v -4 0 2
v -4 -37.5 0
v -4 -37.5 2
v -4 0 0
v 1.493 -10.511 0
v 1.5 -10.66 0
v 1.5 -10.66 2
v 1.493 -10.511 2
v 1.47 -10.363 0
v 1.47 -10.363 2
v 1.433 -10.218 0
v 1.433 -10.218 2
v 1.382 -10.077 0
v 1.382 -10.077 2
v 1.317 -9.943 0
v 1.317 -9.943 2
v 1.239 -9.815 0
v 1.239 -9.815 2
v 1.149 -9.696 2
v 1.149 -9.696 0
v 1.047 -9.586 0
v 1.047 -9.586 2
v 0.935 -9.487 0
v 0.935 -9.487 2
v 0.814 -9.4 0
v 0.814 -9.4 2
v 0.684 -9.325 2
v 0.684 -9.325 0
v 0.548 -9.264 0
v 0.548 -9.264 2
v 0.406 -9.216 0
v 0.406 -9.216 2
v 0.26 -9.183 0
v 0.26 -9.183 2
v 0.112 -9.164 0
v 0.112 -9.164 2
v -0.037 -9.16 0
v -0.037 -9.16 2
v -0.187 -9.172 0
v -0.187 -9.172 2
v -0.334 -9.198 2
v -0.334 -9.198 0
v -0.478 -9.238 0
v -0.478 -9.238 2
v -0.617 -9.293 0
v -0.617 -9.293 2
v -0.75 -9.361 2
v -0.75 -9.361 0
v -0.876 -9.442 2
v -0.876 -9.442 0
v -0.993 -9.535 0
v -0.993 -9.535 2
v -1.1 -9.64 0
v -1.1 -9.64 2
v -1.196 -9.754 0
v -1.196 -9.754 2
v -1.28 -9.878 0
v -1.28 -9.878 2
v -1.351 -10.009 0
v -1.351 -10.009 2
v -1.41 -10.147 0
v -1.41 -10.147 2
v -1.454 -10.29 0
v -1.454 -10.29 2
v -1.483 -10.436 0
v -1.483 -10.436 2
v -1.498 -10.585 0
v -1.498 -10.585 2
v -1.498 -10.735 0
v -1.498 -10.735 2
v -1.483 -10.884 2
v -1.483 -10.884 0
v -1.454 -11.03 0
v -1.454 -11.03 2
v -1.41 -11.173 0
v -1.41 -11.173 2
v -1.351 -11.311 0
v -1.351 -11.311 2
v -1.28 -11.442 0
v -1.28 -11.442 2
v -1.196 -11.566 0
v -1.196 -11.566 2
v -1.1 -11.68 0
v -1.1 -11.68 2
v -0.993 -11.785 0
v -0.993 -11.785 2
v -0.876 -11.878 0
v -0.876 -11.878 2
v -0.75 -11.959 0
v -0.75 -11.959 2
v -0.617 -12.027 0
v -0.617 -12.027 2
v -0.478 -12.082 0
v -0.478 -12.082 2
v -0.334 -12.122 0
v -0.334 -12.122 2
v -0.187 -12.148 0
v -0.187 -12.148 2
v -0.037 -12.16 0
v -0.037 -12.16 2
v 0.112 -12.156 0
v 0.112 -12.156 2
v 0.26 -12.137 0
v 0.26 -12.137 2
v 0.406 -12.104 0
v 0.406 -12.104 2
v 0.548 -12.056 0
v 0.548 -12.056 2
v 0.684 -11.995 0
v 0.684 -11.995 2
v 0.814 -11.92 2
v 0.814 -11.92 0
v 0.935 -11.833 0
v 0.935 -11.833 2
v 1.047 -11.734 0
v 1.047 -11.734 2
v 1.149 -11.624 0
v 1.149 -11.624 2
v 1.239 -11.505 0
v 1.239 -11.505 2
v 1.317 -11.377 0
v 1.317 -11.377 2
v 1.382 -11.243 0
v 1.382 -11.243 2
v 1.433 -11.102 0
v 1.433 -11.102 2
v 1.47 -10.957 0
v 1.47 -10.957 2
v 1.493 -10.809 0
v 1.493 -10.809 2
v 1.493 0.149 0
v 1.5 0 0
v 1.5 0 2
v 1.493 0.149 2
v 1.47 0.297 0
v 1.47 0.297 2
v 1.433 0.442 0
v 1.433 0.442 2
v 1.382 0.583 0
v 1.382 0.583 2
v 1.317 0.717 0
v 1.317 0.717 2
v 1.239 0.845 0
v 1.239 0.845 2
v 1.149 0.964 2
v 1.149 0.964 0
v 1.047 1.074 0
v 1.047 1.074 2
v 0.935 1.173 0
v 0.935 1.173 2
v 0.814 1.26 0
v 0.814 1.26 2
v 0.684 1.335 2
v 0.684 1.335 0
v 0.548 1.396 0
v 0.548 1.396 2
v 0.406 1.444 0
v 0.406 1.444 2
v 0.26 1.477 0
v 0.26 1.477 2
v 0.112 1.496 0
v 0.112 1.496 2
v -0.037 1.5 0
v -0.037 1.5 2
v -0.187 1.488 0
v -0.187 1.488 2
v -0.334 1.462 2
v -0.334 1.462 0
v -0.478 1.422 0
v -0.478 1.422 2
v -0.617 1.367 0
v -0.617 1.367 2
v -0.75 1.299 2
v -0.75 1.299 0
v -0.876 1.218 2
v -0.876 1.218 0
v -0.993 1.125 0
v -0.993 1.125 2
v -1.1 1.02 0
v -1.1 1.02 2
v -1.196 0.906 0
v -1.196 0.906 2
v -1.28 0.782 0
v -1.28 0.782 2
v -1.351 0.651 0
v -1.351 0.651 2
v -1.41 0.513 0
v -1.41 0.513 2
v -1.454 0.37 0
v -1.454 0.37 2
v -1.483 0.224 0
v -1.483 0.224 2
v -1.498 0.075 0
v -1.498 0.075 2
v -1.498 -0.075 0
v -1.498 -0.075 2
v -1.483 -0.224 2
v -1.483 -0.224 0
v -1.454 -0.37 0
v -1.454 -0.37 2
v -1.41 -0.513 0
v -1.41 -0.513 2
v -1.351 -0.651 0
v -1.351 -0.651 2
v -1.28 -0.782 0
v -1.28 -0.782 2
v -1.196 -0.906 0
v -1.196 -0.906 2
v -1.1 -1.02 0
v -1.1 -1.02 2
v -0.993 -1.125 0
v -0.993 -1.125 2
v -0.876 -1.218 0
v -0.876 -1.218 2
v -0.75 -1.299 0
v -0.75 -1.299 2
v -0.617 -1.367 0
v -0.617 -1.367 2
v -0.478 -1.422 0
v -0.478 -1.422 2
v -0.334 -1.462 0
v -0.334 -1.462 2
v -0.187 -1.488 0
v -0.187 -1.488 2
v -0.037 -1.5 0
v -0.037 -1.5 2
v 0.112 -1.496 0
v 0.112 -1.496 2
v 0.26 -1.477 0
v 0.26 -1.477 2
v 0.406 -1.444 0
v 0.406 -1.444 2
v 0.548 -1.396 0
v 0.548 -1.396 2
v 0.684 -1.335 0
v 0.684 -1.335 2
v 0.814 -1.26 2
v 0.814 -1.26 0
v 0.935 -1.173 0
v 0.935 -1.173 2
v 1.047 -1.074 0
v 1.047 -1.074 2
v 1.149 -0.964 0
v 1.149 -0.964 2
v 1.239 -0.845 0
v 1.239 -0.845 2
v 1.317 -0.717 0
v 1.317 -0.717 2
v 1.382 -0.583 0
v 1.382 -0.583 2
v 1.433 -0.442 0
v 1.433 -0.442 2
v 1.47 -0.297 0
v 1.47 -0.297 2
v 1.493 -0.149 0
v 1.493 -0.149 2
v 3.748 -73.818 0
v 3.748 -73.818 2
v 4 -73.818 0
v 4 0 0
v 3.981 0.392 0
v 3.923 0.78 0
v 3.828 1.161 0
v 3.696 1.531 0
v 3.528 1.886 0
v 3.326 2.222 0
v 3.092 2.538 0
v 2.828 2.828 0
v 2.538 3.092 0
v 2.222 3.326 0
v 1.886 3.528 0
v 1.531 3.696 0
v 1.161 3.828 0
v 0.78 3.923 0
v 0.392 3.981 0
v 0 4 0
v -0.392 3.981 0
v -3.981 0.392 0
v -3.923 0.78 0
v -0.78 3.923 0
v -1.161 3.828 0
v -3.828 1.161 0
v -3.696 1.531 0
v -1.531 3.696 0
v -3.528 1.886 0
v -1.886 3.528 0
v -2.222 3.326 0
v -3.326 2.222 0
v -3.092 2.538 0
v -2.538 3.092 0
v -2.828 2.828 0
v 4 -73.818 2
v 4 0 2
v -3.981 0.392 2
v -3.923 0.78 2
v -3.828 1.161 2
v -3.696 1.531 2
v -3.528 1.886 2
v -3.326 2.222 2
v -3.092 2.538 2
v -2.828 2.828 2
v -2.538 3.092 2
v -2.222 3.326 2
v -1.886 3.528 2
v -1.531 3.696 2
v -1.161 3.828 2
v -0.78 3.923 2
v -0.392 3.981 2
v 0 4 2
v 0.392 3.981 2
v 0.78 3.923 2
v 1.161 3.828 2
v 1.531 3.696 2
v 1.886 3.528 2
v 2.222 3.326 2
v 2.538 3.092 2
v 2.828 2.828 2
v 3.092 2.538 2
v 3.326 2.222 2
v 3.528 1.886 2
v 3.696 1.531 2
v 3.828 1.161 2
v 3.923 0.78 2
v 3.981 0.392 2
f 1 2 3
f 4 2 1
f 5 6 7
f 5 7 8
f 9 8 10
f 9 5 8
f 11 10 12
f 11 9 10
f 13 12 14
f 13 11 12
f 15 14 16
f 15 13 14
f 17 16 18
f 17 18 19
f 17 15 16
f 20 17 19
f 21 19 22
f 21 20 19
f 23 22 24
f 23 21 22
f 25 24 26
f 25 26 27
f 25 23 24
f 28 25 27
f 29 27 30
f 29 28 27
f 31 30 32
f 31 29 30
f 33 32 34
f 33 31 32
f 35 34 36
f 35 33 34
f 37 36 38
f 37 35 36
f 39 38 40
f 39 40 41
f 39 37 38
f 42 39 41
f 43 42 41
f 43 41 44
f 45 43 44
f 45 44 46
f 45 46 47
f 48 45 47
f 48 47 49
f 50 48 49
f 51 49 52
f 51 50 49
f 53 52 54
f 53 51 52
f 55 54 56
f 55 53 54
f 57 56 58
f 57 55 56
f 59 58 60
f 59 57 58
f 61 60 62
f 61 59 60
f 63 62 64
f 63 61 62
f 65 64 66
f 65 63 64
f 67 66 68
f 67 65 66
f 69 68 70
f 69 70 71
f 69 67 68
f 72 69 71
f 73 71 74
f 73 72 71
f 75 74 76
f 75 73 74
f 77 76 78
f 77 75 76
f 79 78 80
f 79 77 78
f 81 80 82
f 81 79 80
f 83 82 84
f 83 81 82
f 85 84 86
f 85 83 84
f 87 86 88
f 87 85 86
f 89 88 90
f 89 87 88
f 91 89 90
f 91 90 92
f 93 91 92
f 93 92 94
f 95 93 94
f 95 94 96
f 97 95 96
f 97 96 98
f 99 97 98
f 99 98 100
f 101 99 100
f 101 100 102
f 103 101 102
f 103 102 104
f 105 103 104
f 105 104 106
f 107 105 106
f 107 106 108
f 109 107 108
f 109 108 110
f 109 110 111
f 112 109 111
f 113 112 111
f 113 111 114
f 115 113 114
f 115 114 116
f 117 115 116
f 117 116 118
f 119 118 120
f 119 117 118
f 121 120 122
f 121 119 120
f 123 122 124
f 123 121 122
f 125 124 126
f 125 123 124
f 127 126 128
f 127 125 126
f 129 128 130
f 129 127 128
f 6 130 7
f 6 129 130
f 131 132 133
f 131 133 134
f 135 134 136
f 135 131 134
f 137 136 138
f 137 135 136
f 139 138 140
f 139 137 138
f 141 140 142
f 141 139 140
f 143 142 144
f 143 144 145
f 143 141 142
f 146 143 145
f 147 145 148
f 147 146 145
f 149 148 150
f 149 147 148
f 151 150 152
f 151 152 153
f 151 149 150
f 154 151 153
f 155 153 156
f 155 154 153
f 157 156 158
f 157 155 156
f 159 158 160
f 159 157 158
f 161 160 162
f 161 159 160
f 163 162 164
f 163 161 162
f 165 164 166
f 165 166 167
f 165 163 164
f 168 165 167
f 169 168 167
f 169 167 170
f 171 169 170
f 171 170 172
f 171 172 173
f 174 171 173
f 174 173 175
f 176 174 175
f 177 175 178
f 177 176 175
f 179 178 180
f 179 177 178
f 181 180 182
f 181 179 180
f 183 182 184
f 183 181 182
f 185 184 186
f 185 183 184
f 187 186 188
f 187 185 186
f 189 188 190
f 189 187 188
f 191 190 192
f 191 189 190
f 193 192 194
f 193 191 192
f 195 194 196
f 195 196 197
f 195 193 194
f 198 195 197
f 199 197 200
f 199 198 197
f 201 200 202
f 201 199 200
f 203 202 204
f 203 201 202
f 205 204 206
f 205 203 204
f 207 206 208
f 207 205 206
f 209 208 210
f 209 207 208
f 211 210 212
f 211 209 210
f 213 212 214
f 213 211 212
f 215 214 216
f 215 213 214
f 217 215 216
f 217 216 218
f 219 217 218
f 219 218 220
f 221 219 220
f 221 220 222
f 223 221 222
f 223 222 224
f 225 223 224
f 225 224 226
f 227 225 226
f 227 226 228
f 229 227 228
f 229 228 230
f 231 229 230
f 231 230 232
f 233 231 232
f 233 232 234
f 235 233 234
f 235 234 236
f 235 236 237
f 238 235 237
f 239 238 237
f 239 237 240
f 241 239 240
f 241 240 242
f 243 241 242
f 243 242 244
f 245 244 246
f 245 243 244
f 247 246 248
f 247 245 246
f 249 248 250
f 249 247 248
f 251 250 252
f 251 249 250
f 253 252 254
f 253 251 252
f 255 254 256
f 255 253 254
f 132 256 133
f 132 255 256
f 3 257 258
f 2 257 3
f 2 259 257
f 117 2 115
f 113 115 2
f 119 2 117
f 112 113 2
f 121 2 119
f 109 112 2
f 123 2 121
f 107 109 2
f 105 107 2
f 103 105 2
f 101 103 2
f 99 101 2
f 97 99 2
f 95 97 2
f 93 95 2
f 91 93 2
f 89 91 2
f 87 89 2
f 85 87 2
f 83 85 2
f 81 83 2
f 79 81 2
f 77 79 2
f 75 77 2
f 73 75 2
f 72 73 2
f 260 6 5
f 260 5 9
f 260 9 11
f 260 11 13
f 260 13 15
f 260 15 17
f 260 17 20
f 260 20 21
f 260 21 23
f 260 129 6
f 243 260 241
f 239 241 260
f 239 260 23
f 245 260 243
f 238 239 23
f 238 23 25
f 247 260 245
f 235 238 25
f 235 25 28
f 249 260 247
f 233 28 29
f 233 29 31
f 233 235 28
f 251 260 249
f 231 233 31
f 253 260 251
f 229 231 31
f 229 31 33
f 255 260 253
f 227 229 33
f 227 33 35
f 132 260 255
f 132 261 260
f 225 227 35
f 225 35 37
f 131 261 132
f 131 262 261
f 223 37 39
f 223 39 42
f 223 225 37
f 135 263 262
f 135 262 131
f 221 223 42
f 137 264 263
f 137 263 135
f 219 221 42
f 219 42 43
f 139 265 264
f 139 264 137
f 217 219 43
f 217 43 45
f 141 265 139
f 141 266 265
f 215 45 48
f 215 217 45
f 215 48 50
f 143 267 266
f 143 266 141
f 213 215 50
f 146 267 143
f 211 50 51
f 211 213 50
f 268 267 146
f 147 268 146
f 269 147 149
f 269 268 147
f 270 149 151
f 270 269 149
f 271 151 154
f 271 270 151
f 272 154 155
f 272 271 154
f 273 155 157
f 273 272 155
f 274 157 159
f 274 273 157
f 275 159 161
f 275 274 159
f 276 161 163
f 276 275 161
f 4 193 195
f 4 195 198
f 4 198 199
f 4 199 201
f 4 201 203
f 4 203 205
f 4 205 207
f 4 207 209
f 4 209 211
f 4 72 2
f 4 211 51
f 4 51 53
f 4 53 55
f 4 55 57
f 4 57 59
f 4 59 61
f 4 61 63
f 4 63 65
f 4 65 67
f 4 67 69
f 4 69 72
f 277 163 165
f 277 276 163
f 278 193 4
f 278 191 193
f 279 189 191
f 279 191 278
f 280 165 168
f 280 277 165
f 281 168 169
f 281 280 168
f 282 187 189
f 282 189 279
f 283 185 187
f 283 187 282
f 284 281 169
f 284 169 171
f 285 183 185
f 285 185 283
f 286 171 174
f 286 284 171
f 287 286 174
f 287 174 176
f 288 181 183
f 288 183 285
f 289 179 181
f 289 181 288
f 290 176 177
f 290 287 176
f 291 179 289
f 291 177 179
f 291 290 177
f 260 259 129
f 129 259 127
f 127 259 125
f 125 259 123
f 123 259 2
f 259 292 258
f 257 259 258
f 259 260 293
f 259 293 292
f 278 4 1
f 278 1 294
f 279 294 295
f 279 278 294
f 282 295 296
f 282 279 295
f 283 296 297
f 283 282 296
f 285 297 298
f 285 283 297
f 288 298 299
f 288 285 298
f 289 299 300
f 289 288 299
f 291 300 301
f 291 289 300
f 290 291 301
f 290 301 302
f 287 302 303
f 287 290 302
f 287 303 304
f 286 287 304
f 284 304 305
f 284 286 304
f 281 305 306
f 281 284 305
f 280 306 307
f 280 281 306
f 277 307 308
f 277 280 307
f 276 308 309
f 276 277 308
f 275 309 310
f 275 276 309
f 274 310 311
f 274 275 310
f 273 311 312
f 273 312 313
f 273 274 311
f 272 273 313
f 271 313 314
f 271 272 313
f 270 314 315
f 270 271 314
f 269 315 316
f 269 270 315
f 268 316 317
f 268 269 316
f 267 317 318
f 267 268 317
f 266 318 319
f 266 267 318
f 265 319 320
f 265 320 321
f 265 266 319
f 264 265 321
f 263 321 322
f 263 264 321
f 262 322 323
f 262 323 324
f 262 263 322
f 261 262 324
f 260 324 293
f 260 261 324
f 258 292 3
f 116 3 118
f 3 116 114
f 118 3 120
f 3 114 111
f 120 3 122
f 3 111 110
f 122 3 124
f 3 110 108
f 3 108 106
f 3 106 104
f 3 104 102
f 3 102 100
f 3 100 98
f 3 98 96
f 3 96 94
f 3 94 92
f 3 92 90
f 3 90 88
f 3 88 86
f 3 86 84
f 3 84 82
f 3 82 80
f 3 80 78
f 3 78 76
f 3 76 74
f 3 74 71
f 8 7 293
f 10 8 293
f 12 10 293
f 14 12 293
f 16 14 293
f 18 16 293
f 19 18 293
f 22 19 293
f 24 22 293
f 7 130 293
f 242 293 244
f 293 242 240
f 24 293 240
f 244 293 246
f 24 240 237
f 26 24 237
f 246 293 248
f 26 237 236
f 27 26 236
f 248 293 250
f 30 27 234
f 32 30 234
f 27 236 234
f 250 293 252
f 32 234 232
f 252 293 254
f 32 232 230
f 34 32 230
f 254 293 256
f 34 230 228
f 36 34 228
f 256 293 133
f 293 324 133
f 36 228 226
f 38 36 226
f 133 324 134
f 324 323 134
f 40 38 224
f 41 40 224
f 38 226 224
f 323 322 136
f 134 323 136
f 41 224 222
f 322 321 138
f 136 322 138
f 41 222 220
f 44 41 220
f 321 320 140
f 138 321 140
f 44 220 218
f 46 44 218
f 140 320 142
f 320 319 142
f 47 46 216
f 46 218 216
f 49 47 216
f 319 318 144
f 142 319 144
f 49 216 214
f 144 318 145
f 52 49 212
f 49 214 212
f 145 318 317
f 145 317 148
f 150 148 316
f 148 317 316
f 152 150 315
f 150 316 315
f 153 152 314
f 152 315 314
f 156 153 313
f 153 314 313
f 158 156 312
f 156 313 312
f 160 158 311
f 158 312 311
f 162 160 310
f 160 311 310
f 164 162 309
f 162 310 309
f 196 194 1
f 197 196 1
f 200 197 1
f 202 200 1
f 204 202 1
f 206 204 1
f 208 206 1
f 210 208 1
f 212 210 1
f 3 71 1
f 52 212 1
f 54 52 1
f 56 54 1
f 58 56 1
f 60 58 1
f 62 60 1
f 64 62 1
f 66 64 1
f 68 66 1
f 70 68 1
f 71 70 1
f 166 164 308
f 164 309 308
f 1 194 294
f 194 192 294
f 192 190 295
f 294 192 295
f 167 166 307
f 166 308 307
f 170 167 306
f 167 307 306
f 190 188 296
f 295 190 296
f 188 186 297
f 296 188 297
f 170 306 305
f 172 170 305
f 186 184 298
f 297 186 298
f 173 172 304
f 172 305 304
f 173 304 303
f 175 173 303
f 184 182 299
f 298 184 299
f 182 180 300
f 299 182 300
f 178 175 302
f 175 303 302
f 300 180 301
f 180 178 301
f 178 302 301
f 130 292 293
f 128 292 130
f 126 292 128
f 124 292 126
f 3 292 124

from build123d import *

# Parameters (mm, degrees)
SKETCH_1_R          = 1.5
EXTRUDE_1_DEPTH     = 2
CUT_EXTRUDE_1_DEPTH = 2


with BuildPart() as part:
    # 草图1 → 凸台-拉伸1 (new body)
    with BuildSketch(Plane.XY):
        with BuildLine():
            Line((4, 0), (4, -75))
            Line((4, -75), (-4, -37.5))
            Line((-4, -37.5), (-4, 0))
            ThreePointArc((-4, 0), (0, 4), (4, 0))
        make_face()
        Circle(SKETCH_1_R, mode=Mode.SUBTRACT)
        with Locations((0, -10.66)):
            Circle(SKETCH_1_R, mode=Mode.SUBTRACT)
    extrude(amount=EXTRUDE_1_DEPTH)

    # 草图2 → 切除-拉伸1 (cut)
    with BuildSketch(Plane.XY.offset(2)):
        Polygon((4, -73.818025818), (3.747845508, -73.818025818), (4, -75), align=None)
    extrude(amount=-CUT_EXTRUDE_1_DEPTH, mode=Mode.SUBTRACT)


solid = part.part
